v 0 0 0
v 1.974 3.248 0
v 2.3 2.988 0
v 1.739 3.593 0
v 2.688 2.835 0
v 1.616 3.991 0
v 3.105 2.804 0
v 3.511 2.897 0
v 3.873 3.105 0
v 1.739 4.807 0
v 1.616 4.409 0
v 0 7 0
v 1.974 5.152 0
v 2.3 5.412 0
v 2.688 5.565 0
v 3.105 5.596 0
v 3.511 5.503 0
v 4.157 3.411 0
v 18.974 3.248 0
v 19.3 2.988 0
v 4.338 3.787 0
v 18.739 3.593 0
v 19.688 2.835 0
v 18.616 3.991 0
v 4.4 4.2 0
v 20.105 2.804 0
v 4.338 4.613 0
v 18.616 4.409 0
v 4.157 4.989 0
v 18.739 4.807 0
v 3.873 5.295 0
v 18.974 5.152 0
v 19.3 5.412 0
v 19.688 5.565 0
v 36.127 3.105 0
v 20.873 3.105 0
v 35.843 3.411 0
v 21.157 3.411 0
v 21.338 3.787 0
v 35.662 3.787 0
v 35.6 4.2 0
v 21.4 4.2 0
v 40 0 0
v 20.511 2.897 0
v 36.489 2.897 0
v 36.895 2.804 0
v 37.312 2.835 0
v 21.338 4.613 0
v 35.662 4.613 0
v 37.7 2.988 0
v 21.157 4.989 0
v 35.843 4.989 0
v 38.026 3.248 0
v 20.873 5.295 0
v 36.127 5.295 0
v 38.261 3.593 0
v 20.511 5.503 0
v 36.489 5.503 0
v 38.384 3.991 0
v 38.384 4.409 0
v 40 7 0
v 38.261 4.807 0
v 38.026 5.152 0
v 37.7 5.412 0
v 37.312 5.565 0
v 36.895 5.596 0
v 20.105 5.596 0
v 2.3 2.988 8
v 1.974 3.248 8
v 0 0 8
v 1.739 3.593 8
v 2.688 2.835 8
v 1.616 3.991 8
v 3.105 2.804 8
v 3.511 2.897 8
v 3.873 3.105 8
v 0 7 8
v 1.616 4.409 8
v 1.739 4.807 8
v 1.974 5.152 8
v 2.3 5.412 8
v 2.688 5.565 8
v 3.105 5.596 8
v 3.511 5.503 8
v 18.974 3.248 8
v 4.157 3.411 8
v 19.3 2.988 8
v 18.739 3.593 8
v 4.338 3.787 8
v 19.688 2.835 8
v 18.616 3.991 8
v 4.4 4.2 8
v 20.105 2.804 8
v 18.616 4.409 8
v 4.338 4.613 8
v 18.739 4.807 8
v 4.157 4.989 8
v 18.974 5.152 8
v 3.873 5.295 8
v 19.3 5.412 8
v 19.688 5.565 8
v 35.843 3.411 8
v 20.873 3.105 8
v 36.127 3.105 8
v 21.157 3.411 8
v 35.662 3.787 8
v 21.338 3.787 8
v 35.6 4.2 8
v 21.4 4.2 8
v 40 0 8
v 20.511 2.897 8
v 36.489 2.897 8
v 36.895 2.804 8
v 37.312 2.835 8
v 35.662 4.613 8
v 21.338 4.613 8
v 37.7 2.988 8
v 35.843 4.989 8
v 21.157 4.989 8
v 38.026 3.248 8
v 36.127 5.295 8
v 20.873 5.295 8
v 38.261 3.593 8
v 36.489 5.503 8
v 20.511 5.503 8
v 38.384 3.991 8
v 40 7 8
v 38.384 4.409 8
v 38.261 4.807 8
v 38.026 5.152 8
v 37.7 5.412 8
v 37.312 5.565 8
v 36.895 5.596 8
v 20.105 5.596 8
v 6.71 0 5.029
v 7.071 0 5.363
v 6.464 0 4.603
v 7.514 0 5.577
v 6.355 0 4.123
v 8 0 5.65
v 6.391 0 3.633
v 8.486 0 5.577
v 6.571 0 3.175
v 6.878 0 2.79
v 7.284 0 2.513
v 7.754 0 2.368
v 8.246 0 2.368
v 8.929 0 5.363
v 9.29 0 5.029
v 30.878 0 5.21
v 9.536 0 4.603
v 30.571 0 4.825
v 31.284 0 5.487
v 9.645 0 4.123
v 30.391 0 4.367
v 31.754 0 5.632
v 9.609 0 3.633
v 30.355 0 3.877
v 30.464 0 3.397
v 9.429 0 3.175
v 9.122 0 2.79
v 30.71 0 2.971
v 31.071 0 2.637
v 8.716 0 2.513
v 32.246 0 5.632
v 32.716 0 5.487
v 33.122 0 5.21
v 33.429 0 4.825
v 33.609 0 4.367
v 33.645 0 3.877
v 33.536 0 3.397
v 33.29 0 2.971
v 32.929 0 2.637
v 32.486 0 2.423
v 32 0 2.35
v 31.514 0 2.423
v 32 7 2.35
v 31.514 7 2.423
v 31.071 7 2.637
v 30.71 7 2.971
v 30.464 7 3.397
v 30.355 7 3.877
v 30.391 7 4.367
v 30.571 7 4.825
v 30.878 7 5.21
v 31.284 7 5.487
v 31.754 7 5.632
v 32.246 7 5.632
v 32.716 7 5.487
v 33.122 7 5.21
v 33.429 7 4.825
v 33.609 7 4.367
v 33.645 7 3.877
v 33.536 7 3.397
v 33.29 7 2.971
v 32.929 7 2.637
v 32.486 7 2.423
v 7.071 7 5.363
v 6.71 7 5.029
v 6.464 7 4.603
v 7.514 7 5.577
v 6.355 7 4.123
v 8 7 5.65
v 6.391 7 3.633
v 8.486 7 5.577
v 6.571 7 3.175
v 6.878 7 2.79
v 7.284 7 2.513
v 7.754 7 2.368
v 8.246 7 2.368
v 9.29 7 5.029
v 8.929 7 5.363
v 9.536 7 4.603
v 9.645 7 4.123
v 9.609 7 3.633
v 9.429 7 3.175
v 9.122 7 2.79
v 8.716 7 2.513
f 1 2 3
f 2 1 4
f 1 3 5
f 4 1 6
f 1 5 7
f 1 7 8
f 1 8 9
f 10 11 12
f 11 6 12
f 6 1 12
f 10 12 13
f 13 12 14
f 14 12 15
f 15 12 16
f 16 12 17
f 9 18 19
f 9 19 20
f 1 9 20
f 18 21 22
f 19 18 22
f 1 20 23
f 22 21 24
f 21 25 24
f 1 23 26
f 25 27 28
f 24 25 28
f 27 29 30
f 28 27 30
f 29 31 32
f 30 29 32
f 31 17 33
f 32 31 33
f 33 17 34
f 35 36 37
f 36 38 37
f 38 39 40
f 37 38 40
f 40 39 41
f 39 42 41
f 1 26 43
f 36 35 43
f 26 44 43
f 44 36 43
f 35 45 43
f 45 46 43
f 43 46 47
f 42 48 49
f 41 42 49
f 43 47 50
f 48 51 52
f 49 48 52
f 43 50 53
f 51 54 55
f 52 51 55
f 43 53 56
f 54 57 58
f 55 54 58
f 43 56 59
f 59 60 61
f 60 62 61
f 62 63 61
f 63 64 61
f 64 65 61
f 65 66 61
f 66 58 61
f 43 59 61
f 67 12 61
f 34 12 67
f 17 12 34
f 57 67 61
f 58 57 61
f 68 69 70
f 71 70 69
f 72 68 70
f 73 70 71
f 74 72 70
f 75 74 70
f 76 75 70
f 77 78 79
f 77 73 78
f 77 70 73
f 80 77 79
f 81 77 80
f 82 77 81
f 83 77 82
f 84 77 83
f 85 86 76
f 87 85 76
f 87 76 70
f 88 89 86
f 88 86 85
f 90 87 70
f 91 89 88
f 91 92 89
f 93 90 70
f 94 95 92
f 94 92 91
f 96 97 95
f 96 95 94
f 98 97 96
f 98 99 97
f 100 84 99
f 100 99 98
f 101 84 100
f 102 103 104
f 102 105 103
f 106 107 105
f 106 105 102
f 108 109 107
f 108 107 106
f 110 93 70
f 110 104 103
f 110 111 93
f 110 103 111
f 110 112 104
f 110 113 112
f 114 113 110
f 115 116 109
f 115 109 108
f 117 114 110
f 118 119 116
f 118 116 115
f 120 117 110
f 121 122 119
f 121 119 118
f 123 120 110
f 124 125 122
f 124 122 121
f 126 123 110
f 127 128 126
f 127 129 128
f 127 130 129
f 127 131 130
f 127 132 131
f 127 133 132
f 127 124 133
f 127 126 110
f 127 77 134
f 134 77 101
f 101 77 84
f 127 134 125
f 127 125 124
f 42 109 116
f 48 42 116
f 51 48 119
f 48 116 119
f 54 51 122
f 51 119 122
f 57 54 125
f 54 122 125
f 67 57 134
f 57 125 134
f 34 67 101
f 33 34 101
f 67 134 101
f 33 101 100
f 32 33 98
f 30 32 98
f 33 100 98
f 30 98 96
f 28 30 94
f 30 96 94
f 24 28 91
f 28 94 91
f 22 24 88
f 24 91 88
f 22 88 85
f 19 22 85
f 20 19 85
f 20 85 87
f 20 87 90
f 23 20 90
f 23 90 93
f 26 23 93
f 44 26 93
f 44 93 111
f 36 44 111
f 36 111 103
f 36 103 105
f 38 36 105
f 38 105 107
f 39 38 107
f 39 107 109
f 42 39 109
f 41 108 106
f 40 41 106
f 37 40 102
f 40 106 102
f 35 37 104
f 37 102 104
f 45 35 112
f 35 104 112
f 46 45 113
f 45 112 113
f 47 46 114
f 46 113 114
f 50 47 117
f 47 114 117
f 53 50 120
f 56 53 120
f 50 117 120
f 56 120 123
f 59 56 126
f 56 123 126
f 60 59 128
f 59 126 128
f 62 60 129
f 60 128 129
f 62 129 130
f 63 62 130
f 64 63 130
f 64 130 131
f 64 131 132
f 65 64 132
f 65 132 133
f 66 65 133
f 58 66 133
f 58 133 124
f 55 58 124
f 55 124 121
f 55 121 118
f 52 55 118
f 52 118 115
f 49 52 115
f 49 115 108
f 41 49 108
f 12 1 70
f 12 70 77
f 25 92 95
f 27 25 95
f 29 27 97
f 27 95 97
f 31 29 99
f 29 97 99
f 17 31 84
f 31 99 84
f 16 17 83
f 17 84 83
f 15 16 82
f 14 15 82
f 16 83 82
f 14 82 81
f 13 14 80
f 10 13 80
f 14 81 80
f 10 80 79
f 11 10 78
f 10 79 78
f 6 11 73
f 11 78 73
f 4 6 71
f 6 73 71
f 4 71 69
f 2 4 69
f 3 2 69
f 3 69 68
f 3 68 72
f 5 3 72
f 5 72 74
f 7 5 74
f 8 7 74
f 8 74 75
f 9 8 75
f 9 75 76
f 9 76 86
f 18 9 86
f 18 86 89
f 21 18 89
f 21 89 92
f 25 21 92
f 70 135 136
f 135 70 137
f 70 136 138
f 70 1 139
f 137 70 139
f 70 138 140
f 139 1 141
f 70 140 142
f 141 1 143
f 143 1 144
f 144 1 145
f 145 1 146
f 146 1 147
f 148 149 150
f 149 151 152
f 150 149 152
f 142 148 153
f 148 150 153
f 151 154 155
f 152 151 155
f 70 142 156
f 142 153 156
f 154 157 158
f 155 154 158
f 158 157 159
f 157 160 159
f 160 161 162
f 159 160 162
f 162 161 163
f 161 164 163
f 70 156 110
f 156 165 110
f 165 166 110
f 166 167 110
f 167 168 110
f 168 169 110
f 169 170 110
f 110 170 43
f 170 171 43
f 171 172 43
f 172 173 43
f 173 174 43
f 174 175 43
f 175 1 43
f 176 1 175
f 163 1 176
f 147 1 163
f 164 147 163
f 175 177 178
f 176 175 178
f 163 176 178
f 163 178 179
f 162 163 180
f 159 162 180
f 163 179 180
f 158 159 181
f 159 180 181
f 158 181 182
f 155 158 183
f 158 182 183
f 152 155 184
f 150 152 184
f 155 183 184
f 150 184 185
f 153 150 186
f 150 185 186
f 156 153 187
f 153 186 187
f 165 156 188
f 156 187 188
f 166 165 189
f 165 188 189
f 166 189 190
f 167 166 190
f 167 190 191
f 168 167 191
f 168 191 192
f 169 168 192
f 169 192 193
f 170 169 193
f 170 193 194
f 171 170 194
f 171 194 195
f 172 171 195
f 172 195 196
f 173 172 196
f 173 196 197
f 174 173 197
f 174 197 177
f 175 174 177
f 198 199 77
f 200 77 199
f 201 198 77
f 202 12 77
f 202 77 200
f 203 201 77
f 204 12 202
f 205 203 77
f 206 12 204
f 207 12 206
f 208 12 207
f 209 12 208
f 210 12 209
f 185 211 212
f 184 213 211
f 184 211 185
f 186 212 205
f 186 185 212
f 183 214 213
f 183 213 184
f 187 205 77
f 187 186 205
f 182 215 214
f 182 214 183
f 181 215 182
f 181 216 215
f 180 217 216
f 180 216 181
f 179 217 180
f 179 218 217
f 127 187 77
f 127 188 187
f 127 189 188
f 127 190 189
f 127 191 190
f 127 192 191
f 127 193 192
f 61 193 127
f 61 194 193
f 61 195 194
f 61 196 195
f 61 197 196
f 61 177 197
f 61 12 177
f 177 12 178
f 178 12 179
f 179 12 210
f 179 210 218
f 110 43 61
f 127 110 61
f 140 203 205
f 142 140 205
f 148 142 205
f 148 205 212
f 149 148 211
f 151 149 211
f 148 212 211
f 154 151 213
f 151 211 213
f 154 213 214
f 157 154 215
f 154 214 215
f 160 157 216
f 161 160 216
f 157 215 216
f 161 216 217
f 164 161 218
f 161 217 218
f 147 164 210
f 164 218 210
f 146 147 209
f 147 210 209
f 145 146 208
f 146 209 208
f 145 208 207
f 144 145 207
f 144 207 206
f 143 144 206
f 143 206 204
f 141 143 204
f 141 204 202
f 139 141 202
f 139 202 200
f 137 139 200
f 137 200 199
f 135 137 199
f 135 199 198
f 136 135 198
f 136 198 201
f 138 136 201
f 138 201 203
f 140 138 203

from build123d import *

# Parameters (mm, degrees)
ESQUISSE1_W             = 40
ESQUISSE1_H             = 7
BOSS_EXTRU_1_DEPTH      = 8
ESQUISSE2_R             = 1.4
ENL_V_MAT_EXTRU_1_DEPTH = 42.388404173
ESQUISSE3_R             = 1.65
ENL_V_MAT_EXTRU_2_DEPTH = 42.388404173


with BuildPart() as part:
    # Esquisse1 → Boss.-Extru.1 (new body)
    with BuildSketch(Plane.XY):
        with Locations((20, 3.5)):
            Rectangle(ESQUISSE1_W, ESQUISSE1_H)
    extrude(amount=BOSS_EXTRU_1_DEPTH)

    # Esquisse2 → Enlèv. mat.-Extru.1 (cut, through all)
    with BuildSketch(Plane.XY.offset(8)):
        with Locations((20, 4.2)):
            Circle(ESQUISSE2_R)
        with Locations((3, 4.2)):
            Circle(ESQUISSE2_R)
        with Locations(Location((37, 4.2, 0), (0, 0, 180))):
            Circle(ESQUISSE2_R)
    extrude(amount=-ENL_V_MAT_EXTRU_1_DEPTH, mode=Mode.SUBTRACT)

    # Esquisse3 → Enlèv. mat.-Extru.2 (cut, through all)
    with BuildSketch(Plane(origin=(0, 7, 0), x_dir=(1, 0, 0), z_dir=(0, 1, 0))):
        with Locations(Location((8, -4, 0), (0, 0, 270))):
            Circle(ESQUISSE3_R)
        with Locations(Location((32, -4, 0), (0, 0, 90))):
            Circle(ESQUISSE3_R)
    extrude(amount=-ENL_V_MAT_EXTRU_2_DEPTH, mode=Mode.SUBTRACT)


solid = part.part
